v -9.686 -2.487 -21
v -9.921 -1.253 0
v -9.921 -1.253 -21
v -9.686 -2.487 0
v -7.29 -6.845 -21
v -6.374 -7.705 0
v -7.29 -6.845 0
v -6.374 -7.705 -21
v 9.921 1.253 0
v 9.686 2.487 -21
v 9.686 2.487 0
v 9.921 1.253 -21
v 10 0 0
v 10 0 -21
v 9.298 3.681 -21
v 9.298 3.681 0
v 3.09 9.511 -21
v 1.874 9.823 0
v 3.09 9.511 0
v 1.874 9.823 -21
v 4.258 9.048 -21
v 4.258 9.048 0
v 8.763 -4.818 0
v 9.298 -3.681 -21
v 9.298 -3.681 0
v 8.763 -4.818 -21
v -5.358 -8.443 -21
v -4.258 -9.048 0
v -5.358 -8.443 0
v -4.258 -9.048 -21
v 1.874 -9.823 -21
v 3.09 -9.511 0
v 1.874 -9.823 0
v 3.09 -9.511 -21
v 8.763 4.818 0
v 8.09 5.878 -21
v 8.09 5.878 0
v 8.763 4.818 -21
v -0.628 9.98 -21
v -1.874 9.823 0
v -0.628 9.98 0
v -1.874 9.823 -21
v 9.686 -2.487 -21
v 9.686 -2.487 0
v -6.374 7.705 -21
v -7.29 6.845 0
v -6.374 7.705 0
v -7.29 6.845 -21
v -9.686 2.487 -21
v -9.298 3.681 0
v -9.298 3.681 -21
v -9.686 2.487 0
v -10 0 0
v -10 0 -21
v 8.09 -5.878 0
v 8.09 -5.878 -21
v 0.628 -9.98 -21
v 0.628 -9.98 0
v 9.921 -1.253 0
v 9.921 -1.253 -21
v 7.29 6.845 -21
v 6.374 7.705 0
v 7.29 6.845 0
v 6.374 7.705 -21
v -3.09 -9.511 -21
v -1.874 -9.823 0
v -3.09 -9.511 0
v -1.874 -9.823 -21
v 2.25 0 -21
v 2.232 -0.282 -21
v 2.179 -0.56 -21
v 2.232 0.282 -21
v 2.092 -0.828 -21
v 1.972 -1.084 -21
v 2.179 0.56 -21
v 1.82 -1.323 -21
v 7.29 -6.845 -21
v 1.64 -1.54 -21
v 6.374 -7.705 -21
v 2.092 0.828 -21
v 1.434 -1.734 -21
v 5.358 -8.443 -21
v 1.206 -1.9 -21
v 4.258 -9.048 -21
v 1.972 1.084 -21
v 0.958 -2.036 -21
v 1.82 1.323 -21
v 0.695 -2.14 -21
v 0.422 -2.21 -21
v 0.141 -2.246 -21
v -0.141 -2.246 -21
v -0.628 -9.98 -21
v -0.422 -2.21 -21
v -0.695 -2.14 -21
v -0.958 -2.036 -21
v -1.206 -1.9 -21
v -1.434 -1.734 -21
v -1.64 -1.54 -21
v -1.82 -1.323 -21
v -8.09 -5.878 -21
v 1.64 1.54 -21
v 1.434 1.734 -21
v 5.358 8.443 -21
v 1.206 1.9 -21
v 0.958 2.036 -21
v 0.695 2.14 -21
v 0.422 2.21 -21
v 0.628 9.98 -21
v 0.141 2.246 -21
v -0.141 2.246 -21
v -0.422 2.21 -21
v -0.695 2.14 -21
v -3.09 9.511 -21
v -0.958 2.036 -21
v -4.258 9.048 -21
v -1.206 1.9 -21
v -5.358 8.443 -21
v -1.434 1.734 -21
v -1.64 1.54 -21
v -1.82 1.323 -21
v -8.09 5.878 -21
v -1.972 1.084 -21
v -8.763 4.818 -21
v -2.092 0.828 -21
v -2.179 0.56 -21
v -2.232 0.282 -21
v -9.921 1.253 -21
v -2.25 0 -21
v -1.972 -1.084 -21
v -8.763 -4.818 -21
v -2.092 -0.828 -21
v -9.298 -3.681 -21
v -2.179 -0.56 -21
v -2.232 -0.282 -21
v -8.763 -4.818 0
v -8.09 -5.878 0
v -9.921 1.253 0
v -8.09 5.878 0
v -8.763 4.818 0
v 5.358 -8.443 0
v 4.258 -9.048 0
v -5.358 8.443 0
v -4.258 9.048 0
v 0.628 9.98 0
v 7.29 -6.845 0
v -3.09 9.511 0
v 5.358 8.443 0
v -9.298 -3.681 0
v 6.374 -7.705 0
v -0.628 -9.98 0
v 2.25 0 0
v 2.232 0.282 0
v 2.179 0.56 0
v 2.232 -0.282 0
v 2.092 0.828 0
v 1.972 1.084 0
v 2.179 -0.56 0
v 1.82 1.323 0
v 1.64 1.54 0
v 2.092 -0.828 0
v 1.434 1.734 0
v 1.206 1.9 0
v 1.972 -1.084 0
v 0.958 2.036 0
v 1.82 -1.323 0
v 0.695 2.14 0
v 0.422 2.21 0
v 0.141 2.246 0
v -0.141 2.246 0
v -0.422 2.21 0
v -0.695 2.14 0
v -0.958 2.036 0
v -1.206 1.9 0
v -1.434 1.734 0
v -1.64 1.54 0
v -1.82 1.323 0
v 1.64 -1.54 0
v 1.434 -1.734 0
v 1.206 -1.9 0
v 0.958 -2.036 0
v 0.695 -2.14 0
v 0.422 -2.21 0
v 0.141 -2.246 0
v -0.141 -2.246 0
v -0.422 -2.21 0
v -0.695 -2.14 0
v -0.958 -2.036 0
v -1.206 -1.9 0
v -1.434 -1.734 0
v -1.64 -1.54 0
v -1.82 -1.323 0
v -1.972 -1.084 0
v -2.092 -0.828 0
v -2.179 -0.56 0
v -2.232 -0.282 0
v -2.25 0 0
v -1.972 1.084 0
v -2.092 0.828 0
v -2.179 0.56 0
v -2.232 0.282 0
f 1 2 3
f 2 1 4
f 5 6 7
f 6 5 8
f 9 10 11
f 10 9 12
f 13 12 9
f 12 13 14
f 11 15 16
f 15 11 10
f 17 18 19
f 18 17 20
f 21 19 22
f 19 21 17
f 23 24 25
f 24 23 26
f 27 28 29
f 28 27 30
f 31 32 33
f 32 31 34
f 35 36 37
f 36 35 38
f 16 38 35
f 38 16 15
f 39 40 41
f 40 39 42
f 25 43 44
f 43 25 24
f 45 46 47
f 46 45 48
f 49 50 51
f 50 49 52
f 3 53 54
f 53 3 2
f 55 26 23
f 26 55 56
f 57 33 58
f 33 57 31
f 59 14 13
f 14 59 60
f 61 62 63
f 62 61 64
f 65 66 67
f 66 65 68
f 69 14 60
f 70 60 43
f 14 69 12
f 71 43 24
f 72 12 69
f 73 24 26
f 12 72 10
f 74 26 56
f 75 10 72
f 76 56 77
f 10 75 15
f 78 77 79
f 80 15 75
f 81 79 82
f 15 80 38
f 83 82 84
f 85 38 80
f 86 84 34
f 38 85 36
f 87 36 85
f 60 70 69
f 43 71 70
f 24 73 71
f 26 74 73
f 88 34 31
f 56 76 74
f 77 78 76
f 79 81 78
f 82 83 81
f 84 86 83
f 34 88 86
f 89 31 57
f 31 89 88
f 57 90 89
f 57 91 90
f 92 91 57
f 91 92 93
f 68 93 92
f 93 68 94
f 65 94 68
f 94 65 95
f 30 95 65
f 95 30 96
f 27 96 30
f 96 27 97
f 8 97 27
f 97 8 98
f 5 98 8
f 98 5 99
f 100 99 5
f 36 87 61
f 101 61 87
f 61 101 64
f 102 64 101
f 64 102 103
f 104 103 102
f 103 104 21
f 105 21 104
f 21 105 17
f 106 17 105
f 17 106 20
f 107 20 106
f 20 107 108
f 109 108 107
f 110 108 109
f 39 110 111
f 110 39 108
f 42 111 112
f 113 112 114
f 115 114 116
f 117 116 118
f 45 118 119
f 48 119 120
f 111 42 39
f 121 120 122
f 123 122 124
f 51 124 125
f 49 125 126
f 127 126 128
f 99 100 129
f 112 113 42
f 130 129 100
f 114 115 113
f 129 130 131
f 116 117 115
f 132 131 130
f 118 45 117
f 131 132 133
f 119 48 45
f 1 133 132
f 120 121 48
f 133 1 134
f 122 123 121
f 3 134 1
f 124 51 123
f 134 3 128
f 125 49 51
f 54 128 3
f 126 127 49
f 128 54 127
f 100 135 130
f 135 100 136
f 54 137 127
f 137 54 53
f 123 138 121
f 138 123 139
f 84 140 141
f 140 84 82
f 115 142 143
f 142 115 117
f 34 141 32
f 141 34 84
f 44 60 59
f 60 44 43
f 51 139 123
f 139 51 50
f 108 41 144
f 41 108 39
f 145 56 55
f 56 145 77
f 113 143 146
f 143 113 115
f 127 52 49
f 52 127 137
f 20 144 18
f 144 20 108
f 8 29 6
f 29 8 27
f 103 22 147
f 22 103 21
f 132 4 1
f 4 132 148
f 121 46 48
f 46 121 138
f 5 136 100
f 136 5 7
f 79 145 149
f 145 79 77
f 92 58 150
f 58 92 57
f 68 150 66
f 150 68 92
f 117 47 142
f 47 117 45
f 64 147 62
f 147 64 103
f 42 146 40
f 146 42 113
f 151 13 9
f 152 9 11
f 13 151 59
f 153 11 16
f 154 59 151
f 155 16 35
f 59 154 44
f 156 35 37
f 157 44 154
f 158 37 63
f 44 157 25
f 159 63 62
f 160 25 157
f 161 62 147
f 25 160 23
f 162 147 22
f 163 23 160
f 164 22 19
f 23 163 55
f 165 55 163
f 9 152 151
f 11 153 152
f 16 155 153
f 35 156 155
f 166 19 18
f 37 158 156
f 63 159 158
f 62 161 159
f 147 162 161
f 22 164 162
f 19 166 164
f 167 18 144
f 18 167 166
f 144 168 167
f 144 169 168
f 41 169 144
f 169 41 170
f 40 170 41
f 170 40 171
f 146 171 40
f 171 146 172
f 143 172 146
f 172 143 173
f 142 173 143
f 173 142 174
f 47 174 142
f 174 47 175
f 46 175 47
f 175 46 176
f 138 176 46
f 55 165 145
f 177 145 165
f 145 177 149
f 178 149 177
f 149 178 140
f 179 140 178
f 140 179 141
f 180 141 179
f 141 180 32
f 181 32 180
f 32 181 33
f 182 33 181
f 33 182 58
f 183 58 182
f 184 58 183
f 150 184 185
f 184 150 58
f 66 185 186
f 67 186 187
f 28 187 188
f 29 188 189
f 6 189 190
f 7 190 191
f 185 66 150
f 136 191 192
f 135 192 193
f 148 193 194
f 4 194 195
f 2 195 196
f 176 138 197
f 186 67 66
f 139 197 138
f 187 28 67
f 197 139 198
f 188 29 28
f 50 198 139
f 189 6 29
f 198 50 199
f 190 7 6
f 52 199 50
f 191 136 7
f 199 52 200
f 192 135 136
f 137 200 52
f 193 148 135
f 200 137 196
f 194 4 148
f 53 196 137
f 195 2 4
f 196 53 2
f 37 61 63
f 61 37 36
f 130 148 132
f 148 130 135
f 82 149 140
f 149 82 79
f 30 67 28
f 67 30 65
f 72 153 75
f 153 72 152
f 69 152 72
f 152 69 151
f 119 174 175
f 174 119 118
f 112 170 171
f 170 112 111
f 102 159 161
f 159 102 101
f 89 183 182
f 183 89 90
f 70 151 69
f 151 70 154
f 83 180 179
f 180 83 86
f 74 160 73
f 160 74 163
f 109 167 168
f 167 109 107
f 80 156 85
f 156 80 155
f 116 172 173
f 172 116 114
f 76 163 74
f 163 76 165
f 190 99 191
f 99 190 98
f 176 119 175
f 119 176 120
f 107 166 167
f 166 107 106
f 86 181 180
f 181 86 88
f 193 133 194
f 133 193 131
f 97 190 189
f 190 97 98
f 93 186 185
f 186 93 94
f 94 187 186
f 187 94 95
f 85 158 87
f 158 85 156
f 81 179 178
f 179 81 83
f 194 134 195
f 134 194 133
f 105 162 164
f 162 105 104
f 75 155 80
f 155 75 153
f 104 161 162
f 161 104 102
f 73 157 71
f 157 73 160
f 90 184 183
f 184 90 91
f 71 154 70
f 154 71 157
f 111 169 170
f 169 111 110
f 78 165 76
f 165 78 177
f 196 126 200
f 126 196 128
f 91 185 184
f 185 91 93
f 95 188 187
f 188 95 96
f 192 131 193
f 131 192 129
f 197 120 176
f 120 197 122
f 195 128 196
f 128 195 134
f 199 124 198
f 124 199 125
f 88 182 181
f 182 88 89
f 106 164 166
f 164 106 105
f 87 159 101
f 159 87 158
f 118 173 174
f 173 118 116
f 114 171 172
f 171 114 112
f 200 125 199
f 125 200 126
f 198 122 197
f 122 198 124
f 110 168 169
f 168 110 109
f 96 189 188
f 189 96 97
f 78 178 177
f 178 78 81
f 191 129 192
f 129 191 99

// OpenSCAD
$fn = 50;


difference() {
	union() {
		translate(v = [0, 0, -21.0000000000]) {
			cylinder(h = 21, r = 10.0000000000);
		}
		cylinder(h = 0, r = 13.0000000000);
	}
	union() {
		#translate(v = [0, 0, -21]) {
			cylinder(h = 21, r = 2.2500000000);
		}
	}
}
